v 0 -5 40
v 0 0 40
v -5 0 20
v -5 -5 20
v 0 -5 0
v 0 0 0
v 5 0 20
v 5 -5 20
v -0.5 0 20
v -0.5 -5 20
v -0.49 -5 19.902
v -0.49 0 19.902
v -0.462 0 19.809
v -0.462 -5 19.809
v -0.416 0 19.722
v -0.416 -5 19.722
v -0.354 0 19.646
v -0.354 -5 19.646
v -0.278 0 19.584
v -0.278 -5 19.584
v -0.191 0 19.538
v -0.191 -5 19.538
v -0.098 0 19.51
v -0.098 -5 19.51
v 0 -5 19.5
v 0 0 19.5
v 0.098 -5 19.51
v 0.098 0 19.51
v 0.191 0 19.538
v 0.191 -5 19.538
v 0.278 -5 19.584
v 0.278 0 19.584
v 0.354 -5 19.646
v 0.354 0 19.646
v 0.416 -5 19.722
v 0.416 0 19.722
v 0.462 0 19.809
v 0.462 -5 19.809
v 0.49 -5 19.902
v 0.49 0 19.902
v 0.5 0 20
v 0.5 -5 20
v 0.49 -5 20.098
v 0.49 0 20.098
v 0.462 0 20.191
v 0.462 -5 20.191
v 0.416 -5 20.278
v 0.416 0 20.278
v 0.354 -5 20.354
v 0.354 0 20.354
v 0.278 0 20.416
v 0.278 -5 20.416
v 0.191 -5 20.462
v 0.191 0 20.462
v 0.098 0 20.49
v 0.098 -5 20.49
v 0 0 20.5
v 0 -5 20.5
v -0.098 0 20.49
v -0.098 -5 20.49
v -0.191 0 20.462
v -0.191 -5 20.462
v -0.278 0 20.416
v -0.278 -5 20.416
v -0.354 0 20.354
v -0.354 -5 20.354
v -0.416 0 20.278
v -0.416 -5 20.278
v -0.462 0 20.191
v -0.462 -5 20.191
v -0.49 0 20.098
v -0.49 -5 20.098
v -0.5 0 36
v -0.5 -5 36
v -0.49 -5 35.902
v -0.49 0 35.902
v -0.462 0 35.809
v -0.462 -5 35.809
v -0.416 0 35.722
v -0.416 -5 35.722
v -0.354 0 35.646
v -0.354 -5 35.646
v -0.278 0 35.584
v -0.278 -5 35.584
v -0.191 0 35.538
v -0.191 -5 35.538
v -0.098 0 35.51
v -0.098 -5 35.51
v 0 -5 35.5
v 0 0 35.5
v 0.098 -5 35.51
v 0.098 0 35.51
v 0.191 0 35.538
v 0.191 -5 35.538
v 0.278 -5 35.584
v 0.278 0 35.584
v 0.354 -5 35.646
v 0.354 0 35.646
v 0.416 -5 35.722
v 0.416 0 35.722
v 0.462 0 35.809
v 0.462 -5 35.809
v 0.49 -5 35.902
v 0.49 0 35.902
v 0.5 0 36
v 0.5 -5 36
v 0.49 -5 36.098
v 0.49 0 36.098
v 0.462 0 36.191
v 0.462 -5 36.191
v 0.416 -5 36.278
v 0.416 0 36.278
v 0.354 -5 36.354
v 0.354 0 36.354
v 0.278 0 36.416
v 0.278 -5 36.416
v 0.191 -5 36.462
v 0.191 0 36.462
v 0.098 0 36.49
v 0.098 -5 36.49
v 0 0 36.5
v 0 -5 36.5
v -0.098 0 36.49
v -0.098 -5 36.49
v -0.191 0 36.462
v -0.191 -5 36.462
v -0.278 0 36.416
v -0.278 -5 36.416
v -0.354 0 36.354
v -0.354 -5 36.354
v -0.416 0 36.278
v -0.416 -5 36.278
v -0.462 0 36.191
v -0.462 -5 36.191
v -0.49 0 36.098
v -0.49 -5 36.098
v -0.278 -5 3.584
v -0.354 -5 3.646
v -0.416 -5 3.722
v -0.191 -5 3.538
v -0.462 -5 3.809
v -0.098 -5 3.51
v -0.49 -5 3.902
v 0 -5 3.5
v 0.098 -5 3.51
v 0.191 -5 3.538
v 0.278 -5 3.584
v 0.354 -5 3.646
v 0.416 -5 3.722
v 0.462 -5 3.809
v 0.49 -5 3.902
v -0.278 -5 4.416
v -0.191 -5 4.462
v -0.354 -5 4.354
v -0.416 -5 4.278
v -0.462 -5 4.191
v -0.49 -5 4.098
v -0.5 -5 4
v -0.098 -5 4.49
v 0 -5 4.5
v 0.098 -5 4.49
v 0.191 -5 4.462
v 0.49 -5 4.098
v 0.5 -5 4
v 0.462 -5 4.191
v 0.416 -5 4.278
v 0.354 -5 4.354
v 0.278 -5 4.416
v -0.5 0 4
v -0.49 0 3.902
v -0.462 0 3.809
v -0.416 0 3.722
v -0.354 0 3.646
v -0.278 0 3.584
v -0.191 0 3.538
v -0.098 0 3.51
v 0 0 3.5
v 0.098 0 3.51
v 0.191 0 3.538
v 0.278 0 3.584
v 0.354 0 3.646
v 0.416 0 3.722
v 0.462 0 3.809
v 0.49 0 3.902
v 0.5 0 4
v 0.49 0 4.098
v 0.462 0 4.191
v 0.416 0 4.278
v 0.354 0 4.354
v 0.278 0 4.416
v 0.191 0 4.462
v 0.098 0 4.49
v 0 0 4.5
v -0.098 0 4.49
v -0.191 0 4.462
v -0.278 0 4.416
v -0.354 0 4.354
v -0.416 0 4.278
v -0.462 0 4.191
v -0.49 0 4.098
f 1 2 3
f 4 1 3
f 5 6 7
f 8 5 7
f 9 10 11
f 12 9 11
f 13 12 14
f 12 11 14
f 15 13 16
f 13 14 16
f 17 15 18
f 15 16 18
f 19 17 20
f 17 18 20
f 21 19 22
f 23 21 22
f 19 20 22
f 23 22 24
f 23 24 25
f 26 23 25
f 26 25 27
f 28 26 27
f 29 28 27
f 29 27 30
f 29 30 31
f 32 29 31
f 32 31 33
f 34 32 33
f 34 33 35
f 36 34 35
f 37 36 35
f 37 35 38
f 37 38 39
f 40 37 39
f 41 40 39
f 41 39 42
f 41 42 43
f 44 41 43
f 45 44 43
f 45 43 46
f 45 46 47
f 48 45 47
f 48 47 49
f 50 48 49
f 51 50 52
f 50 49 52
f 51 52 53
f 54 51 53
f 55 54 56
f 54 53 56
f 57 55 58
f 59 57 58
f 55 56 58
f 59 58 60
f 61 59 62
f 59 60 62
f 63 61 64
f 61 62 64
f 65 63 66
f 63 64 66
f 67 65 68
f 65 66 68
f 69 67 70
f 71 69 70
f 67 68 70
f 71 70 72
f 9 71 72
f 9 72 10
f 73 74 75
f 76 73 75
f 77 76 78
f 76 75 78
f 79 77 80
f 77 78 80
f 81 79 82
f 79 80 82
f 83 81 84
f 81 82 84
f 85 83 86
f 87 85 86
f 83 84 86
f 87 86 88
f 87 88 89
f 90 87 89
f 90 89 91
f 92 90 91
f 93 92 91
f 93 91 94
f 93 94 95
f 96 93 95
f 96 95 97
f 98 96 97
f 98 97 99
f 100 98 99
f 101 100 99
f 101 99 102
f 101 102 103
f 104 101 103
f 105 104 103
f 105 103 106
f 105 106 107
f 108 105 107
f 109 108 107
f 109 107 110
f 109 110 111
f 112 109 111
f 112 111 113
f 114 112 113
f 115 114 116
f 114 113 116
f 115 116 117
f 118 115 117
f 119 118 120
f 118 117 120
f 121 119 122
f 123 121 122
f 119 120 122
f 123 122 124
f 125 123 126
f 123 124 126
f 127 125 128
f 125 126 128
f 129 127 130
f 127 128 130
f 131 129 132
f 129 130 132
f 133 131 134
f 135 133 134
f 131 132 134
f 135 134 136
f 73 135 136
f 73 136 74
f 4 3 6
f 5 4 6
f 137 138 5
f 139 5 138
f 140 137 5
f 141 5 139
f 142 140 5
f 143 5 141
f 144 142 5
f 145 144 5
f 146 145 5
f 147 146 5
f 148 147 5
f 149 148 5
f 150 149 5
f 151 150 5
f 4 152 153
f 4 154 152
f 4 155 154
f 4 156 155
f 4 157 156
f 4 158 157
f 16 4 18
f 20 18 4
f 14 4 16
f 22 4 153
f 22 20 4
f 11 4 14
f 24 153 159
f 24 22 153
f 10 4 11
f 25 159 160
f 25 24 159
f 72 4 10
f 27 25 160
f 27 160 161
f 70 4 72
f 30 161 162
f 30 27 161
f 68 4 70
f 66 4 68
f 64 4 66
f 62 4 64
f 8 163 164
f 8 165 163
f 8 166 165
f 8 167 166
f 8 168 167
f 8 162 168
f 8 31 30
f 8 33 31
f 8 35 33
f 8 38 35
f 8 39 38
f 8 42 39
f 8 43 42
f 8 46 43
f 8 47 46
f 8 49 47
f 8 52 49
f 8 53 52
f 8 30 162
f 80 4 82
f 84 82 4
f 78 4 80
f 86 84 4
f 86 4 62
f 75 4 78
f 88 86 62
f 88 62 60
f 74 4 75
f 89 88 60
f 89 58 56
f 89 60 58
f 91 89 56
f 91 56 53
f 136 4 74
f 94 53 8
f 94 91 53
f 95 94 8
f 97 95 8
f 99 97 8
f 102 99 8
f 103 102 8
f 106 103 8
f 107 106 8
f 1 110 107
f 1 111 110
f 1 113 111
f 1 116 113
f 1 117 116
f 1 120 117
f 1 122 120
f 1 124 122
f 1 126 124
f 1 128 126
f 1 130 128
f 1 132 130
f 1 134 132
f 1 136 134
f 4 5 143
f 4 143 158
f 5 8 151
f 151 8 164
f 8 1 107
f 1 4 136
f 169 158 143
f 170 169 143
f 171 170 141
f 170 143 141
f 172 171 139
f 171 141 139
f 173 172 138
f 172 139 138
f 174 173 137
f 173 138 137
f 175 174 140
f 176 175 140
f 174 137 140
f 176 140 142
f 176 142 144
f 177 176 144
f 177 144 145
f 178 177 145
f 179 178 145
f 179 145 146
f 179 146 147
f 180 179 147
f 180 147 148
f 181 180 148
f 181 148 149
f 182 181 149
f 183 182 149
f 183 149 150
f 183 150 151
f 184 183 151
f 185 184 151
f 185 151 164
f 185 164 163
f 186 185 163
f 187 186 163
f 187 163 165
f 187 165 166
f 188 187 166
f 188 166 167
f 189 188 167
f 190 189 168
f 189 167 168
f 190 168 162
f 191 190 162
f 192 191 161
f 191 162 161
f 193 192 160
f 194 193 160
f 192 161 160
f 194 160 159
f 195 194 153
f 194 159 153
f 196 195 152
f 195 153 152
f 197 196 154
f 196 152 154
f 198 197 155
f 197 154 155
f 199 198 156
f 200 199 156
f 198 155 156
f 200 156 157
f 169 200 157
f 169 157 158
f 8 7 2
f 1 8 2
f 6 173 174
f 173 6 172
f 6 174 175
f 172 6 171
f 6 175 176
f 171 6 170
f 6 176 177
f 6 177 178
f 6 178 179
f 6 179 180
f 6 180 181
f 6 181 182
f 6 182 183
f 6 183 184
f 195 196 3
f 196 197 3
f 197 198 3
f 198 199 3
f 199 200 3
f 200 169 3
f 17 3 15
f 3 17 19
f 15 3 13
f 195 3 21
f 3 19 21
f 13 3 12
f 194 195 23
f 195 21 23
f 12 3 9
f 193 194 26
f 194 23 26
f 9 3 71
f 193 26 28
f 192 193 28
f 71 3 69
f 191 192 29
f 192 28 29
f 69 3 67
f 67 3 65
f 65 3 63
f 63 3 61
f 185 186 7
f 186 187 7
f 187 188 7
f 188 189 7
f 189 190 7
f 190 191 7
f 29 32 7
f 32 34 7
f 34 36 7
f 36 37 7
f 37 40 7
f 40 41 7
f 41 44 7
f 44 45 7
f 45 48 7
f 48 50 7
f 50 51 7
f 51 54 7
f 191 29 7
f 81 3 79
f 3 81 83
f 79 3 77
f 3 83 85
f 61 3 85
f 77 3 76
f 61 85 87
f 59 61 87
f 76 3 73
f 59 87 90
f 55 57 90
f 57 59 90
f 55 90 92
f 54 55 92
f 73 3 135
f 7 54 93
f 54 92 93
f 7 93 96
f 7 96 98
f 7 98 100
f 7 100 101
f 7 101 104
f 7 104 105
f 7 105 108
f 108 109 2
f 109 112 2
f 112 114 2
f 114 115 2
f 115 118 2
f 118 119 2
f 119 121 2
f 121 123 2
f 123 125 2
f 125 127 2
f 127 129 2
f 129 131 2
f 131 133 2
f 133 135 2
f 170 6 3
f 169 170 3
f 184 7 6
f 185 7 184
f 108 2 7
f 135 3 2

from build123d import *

# Parameters (mm, degrees)
F1_DEPTH = 5
F2_D     = 1
F3_D     = 1


with BuildPart() as f1:
    # F0 (on Front) → F1 (new body)
    with BuildSketch(Plane.XZ):
        Polygon((-5, 20), (0, 20), (0, 40), align=None)
        Polygon((0, 20), (0, 0), (5, 20), align=None)
        Polygon((0, 40), (0, 20), (5, 20), align=None)
        Polygon((-5, 20), (0, 0), (0, 20), align=None)
    extrude(amount=F1_DEPTH)

    # F2 (through all)
    with Locations(Plane(origin=(0, 0, 0), x_dir=(1, 0, 0), z_dir=(0, 1, 0))):
        with Locations((0, -20)):
            Hole(F2_D / 2)

    # F3 (through all)
    with Locations(Plane(origin=(0, 0, 0), x_dir=(1, 0, 0), z_dir=(0, 1, 0))):
        with Locations((0, -4), (0, -36)):
            Hole(F3_D / 2)


solid = f1.part
